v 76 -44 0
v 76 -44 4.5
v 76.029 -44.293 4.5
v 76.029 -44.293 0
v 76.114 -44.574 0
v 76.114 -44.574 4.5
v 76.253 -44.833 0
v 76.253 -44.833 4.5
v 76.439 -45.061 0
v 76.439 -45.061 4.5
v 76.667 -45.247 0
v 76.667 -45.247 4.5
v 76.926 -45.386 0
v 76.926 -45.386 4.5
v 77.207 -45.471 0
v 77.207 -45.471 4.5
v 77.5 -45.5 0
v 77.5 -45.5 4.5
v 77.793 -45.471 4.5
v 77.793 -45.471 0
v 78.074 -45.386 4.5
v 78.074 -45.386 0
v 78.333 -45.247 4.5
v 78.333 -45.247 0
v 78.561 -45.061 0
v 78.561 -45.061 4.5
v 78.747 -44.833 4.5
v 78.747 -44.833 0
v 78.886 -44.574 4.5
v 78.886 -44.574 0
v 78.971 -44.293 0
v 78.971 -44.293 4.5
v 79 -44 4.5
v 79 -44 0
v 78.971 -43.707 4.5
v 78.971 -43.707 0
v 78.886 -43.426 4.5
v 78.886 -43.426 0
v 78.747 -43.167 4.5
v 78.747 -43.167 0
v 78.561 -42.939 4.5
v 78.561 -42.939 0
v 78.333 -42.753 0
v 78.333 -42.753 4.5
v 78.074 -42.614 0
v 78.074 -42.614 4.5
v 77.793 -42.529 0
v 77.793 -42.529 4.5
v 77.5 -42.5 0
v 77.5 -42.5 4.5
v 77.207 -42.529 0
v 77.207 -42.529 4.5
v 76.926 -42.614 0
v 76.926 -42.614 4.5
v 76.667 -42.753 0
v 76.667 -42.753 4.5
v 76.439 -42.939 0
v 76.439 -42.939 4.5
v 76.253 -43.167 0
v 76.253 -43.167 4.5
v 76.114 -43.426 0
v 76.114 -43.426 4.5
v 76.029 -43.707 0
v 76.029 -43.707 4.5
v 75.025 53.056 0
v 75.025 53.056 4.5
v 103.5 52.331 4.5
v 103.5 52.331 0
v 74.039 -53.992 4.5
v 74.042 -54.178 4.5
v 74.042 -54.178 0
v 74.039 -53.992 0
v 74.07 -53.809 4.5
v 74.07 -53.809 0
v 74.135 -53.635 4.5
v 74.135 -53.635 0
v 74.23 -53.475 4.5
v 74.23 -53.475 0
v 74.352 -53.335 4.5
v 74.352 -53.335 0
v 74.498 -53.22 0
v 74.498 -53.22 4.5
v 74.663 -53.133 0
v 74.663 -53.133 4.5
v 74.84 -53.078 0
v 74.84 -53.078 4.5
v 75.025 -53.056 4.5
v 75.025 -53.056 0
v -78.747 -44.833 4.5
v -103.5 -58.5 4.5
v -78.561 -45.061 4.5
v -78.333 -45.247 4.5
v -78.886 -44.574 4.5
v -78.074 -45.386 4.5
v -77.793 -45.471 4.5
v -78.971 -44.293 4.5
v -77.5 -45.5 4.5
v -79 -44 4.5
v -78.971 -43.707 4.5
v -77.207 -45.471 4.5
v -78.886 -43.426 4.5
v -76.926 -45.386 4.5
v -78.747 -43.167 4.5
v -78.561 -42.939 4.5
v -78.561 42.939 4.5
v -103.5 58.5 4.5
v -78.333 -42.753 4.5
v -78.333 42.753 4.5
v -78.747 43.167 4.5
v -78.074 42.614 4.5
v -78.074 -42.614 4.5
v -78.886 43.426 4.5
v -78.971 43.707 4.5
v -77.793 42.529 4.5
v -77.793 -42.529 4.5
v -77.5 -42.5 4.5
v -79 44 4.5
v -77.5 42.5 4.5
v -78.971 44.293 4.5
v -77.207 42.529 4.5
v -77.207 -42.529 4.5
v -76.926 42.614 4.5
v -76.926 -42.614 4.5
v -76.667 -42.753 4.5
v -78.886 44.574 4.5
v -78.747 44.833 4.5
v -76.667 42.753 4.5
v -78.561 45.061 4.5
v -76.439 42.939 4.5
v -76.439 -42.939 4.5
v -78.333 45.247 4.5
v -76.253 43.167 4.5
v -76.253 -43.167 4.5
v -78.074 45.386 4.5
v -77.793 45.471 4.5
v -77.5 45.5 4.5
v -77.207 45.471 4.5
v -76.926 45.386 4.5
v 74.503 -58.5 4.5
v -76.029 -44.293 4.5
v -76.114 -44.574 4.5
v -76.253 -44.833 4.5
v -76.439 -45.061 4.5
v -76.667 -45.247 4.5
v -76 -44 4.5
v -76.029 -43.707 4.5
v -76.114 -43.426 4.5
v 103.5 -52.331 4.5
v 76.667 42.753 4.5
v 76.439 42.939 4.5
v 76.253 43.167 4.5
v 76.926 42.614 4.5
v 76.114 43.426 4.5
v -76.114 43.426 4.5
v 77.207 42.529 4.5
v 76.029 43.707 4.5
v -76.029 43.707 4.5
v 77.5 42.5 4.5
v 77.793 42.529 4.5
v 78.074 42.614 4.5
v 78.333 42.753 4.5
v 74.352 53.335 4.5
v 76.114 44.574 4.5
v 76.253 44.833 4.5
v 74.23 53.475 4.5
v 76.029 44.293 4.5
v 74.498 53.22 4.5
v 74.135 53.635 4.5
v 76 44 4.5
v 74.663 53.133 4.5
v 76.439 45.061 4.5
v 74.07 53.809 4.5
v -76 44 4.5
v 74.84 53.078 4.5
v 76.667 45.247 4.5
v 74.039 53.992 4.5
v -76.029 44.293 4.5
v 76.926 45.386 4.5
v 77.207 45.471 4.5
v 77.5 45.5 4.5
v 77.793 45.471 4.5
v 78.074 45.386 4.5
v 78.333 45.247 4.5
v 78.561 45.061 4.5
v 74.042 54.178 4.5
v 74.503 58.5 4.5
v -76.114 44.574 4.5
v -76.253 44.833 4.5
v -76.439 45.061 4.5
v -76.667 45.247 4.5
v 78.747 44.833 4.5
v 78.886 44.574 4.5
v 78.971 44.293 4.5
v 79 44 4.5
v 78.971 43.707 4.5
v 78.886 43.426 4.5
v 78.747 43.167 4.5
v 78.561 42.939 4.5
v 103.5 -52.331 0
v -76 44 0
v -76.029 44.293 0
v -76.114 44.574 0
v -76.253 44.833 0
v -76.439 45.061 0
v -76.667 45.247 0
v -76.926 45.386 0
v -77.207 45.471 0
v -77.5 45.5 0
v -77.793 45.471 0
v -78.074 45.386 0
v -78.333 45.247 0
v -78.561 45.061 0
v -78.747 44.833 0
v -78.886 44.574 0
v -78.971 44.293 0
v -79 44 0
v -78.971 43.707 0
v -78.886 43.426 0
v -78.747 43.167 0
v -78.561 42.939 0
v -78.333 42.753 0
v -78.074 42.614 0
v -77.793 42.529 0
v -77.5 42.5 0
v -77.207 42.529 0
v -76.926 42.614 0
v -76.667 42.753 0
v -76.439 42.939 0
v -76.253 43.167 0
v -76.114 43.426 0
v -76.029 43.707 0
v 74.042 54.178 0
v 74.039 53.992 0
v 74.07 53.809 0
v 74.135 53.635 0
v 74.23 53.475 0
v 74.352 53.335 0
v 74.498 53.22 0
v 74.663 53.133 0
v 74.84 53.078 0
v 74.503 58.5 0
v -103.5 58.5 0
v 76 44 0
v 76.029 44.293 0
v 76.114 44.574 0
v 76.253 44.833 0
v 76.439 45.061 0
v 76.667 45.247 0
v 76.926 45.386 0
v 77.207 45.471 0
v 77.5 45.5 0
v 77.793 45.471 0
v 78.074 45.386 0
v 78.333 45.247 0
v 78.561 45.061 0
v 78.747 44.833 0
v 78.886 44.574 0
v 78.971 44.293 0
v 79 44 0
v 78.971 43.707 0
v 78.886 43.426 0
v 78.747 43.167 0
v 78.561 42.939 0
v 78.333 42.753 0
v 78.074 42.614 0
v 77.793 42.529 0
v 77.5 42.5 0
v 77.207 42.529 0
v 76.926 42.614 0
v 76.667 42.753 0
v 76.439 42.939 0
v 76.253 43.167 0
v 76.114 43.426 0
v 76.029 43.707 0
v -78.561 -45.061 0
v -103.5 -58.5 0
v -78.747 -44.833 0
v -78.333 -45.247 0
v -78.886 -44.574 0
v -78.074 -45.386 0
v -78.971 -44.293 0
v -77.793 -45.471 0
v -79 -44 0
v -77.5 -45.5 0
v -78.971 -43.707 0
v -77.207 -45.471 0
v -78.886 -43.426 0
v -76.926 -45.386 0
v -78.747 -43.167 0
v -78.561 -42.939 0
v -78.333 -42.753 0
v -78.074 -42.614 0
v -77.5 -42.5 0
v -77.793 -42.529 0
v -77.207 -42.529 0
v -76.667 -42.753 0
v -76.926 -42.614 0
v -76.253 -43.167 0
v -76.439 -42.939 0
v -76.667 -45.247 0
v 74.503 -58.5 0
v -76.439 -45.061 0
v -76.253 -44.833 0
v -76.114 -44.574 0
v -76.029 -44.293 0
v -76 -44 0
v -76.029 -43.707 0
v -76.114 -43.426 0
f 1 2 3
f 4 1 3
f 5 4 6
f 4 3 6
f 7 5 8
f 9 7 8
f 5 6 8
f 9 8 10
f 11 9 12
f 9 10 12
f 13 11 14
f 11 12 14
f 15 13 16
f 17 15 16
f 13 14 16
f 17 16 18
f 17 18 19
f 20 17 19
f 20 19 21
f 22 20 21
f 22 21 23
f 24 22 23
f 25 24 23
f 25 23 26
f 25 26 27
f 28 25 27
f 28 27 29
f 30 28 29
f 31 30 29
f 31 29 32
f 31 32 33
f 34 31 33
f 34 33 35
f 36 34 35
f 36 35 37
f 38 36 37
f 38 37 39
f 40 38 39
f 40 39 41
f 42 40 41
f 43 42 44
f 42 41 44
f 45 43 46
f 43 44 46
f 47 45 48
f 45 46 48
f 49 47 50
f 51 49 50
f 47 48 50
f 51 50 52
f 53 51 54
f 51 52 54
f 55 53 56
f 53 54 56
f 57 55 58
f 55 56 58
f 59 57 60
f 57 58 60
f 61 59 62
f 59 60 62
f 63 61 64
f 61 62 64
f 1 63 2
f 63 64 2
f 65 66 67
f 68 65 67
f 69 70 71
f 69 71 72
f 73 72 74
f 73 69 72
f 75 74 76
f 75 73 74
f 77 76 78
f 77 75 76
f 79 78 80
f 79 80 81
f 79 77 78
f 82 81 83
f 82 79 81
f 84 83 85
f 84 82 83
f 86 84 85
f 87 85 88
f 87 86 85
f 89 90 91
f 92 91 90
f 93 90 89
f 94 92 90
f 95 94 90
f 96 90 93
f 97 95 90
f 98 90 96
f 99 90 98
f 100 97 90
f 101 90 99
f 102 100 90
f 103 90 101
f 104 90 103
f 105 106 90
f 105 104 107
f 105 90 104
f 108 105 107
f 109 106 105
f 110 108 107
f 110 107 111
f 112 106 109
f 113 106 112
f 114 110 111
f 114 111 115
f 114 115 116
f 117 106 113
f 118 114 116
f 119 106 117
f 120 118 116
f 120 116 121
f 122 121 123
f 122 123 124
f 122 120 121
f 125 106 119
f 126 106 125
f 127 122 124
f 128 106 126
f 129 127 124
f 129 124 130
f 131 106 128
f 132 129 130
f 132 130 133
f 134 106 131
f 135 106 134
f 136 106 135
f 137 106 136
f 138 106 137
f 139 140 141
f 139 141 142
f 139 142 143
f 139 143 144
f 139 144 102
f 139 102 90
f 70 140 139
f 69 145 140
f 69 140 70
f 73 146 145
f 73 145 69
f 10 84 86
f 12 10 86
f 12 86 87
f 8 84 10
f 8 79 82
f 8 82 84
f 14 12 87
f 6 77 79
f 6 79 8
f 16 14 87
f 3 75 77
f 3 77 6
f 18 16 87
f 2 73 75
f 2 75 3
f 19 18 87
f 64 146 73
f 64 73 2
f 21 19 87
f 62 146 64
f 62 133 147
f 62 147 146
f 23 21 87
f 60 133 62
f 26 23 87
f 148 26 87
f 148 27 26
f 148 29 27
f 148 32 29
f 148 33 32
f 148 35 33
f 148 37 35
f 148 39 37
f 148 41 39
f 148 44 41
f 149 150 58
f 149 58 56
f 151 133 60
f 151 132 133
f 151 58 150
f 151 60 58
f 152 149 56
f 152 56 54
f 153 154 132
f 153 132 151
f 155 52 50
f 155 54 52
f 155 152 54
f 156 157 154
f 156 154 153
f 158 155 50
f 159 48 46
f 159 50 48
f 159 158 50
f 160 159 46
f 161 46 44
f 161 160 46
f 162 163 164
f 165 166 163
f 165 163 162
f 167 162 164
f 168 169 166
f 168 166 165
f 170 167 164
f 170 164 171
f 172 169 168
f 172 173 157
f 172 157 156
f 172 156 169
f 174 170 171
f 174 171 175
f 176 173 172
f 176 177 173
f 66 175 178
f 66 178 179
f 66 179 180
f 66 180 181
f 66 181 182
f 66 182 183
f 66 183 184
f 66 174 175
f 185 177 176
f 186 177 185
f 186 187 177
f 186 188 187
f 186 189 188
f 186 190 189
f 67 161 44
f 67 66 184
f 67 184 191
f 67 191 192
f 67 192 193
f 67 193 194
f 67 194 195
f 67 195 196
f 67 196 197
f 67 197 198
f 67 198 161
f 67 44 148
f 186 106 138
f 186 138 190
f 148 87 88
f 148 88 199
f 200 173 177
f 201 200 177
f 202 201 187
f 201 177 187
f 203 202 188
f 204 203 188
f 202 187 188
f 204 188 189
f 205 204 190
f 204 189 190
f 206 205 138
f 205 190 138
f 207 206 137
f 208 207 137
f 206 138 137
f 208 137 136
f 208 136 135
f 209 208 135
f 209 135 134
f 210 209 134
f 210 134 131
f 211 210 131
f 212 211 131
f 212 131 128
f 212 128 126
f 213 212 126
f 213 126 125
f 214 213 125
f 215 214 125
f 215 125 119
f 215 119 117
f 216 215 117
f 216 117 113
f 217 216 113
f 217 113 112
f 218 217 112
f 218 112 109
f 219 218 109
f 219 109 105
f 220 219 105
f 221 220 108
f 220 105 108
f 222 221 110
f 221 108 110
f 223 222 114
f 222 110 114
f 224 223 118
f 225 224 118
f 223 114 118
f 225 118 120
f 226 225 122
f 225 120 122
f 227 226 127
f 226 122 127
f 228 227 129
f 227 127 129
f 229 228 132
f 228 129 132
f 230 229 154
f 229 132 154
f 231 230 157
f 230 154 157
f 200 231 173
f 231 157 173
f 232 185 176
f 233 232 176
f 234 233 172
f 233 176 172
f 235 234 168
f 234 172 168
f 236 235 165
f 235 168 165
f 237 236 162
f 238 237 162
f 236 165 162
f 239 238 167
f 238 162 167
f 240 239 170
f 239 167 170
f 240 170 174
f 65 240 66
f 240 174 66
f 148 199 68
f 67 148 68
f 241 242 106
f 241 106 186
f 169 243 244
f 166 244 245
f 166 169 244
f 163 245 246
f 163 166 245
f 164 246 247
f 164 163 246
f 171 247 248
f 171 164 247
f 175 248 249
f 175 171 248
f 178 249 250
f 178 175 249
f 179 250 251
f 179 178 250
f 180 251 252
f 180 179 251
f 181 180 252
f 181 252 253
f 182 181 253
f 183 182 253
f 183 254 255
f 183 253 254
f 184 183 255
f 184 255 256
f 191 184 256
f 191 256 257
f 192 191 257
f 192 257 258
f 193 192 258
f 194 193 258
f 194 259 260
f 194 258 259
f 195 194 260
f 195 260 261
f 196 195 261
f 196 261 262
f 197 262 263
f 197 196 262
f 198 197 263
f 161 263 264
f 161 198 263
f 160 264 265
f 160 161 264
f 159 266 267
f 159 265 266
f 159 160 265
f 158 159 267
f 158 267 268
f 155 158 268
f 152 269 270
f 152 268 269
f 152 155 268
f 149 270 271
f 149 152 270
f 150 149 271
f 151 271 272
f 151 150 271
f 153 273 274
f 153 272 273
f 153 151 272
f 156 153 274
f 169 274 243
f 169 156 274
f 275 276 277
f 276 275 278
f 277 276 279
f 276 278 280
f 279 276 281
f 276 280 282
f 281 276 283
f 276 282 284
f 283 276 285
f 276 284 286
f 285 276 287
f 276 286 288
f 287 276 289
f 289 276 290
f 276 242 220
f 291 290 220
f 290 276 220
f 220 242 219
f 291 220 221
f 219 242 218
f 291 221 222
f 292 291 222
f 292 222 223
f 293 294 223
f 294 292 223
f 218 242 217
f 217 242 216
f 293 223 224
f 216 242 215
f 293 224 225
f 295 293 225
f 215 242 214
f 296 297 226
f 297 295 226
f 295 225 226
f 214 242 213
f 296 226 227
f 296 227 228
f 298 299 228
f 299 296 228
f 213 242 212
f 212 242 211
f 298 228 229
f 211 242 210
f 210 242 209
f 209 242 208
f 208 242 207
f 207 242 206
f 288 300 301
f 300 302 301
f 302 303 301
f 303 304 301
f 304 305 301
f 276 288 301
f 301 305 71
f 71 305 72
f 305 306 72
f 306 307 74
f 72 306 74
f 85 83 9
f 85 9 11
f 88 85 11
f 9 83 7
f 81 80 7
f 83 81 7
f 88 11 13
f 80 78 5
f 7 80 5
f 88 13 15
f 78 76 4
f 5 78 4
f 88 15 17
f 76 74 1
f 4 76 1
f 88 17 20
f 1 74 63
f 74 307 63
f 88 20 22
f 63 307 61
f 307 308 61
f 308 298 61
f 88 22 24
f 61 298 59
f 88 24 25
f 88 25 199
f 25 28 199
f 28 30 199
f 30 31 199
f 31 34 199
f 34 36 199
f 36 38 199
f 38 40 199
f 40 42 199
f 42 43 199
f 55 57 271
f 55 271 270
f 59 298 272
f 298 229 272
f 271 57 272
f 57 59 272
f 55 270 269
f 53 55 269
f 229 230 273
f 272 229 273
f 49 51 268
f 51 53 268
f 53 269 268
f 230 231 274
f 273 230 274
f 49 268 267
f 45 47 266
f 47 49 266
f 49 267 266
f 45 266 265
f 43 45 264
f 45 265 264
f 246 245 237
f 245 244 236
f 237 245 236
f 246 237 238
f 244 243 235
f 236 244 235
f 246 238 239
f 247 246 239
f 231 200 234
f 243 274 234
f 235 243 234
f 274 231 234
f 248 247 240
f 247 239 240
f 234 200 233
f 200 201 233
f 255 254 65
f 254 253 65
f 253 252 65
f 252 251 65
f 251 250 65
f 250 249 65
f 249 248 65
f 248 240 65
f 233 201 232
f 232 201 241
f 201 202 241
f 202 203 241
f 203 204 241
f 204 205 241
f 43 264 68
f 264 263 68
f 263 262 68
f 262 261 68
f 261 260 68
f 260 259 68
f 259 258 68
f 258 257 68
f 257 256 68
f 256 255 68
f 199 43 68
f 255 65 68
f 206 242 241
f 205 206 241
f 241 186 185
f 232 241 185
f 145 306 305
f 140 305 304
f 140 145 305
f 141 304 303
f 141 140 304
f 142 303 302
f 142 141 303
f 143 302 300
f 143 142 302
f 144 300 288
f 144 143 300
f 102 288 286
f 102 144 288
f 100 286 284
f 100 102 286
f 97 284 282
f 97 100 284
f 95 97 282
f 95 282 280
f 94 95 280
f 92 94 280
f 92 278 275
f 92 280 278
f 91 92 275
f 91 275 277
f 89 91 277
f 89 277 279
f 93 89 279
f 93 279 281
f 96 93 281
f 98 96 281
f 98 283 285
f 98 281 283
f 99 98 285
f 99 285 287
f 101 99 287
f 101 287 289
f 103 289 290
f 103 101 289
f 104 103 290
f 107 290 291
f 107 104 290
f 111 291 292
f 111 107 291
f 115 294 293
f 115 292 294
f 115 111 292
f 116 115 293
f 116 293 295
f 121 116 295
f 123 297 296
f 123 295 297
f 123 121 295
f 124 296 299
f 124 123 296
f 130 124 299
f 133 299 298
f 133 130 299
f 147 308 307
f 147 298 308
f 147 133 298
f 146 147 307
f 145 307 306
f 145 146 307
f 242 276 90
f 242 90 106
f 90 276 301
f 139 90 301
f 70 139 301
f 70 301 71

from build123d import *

# Parameters (mm, degrees)
SKETCH1_W               = 207
SKETCH1_H               = 117
BOSS_EXTRUDE1_DEPTH     = 4.5
SKETCH2_R               = 1.5
CUT_EXTRUDE1_DEPTH      = 5.5
MIRROR3_COPY_1_SKETCH_R = 1.5
MIRROR3_COPY_1_DEPTH    = 5.5
CUT_EXTRUDE2_DEPTH      = 4.5


with BuildPart() as part:
    # Sketch1 → Boss-Extrude1 (new body)
    with BuildSketch(Plane.XY):
        Rectangle(SKETCH1_W, SKETCH1_H)
    extrude(amount=BOSS_EXTRUDE1_DEPTH)

    # Sketch2 → Cut-Extrude1 (cut, through all)
    with BuildSketch(Plane.XY.offset(4.5)):
        with Locations((-77.5, 44)):
            Circle(SKETCH2_R)
    cut_extrude1 = extrude(amount=-CUT_EXTRUDE1_DEPTH, mode=Mode.SUBTRACT)

    # Mirror1: Cut-Extrude1 across plane
    add(cut_extrude1.mirror(Plane(origin=(0, 0, 0), x_dir=(0, 0, 1), z_dir=(1, 0, 0))), mode=Mode.SUBTRACT)

    # Mirror3: Cut-Extrude1 across plane
    add(cut_extrude1.mirror(Plane.ZX), mode=Mode.SUBTRACT)

    # Mirror3 copy 1 sketch → Mirror3 copy 1 (cut, through all)
    with BuildSketch(Plane(origin=(0, 0, 4.5), x_dir=(-1, 0, 0), z_dir=(0, 0, 1))):
        with Locations((-77.5, 44)):
            Circle(MIRROR3_COPY_1_SKETCH_R)
    extrude(amount=-MIRROR3_COPY_1_DEPTH, mode=Mode.SUBTRACT)

    # Sketch3 → Cut-Extrude2 (cut)
    with BuildSketch(Plane.XY.offset(4.5)):
        with BuildLine():
            Line((74.50260241, 58.5), (74.041825512, 54.178381356))
            ThreePointArc((74.041825512, 54.178381356), (74.287682649, 53.401965683), (75.025093069, 53.056288231))
            Line((75.025093069, 53.056288231), (103.5, 52.330947596))
            Line((103.5, 52.330947596), (103.5, 58.5))
            Line((103.5, 58.5), (74.50260241, 58.5))
        make_face()
    cut_extrude2 = extrude(amount=-CUT_EXTRUDE2_DEPTH, mode=Mode.SUBTRACT)

    # Mirror4: Cut-Extrude2 across plane
    add(cut_extrude2.mirror(Plane.ZX), mode=Mode.SUBTRACT)


solid = part.part
